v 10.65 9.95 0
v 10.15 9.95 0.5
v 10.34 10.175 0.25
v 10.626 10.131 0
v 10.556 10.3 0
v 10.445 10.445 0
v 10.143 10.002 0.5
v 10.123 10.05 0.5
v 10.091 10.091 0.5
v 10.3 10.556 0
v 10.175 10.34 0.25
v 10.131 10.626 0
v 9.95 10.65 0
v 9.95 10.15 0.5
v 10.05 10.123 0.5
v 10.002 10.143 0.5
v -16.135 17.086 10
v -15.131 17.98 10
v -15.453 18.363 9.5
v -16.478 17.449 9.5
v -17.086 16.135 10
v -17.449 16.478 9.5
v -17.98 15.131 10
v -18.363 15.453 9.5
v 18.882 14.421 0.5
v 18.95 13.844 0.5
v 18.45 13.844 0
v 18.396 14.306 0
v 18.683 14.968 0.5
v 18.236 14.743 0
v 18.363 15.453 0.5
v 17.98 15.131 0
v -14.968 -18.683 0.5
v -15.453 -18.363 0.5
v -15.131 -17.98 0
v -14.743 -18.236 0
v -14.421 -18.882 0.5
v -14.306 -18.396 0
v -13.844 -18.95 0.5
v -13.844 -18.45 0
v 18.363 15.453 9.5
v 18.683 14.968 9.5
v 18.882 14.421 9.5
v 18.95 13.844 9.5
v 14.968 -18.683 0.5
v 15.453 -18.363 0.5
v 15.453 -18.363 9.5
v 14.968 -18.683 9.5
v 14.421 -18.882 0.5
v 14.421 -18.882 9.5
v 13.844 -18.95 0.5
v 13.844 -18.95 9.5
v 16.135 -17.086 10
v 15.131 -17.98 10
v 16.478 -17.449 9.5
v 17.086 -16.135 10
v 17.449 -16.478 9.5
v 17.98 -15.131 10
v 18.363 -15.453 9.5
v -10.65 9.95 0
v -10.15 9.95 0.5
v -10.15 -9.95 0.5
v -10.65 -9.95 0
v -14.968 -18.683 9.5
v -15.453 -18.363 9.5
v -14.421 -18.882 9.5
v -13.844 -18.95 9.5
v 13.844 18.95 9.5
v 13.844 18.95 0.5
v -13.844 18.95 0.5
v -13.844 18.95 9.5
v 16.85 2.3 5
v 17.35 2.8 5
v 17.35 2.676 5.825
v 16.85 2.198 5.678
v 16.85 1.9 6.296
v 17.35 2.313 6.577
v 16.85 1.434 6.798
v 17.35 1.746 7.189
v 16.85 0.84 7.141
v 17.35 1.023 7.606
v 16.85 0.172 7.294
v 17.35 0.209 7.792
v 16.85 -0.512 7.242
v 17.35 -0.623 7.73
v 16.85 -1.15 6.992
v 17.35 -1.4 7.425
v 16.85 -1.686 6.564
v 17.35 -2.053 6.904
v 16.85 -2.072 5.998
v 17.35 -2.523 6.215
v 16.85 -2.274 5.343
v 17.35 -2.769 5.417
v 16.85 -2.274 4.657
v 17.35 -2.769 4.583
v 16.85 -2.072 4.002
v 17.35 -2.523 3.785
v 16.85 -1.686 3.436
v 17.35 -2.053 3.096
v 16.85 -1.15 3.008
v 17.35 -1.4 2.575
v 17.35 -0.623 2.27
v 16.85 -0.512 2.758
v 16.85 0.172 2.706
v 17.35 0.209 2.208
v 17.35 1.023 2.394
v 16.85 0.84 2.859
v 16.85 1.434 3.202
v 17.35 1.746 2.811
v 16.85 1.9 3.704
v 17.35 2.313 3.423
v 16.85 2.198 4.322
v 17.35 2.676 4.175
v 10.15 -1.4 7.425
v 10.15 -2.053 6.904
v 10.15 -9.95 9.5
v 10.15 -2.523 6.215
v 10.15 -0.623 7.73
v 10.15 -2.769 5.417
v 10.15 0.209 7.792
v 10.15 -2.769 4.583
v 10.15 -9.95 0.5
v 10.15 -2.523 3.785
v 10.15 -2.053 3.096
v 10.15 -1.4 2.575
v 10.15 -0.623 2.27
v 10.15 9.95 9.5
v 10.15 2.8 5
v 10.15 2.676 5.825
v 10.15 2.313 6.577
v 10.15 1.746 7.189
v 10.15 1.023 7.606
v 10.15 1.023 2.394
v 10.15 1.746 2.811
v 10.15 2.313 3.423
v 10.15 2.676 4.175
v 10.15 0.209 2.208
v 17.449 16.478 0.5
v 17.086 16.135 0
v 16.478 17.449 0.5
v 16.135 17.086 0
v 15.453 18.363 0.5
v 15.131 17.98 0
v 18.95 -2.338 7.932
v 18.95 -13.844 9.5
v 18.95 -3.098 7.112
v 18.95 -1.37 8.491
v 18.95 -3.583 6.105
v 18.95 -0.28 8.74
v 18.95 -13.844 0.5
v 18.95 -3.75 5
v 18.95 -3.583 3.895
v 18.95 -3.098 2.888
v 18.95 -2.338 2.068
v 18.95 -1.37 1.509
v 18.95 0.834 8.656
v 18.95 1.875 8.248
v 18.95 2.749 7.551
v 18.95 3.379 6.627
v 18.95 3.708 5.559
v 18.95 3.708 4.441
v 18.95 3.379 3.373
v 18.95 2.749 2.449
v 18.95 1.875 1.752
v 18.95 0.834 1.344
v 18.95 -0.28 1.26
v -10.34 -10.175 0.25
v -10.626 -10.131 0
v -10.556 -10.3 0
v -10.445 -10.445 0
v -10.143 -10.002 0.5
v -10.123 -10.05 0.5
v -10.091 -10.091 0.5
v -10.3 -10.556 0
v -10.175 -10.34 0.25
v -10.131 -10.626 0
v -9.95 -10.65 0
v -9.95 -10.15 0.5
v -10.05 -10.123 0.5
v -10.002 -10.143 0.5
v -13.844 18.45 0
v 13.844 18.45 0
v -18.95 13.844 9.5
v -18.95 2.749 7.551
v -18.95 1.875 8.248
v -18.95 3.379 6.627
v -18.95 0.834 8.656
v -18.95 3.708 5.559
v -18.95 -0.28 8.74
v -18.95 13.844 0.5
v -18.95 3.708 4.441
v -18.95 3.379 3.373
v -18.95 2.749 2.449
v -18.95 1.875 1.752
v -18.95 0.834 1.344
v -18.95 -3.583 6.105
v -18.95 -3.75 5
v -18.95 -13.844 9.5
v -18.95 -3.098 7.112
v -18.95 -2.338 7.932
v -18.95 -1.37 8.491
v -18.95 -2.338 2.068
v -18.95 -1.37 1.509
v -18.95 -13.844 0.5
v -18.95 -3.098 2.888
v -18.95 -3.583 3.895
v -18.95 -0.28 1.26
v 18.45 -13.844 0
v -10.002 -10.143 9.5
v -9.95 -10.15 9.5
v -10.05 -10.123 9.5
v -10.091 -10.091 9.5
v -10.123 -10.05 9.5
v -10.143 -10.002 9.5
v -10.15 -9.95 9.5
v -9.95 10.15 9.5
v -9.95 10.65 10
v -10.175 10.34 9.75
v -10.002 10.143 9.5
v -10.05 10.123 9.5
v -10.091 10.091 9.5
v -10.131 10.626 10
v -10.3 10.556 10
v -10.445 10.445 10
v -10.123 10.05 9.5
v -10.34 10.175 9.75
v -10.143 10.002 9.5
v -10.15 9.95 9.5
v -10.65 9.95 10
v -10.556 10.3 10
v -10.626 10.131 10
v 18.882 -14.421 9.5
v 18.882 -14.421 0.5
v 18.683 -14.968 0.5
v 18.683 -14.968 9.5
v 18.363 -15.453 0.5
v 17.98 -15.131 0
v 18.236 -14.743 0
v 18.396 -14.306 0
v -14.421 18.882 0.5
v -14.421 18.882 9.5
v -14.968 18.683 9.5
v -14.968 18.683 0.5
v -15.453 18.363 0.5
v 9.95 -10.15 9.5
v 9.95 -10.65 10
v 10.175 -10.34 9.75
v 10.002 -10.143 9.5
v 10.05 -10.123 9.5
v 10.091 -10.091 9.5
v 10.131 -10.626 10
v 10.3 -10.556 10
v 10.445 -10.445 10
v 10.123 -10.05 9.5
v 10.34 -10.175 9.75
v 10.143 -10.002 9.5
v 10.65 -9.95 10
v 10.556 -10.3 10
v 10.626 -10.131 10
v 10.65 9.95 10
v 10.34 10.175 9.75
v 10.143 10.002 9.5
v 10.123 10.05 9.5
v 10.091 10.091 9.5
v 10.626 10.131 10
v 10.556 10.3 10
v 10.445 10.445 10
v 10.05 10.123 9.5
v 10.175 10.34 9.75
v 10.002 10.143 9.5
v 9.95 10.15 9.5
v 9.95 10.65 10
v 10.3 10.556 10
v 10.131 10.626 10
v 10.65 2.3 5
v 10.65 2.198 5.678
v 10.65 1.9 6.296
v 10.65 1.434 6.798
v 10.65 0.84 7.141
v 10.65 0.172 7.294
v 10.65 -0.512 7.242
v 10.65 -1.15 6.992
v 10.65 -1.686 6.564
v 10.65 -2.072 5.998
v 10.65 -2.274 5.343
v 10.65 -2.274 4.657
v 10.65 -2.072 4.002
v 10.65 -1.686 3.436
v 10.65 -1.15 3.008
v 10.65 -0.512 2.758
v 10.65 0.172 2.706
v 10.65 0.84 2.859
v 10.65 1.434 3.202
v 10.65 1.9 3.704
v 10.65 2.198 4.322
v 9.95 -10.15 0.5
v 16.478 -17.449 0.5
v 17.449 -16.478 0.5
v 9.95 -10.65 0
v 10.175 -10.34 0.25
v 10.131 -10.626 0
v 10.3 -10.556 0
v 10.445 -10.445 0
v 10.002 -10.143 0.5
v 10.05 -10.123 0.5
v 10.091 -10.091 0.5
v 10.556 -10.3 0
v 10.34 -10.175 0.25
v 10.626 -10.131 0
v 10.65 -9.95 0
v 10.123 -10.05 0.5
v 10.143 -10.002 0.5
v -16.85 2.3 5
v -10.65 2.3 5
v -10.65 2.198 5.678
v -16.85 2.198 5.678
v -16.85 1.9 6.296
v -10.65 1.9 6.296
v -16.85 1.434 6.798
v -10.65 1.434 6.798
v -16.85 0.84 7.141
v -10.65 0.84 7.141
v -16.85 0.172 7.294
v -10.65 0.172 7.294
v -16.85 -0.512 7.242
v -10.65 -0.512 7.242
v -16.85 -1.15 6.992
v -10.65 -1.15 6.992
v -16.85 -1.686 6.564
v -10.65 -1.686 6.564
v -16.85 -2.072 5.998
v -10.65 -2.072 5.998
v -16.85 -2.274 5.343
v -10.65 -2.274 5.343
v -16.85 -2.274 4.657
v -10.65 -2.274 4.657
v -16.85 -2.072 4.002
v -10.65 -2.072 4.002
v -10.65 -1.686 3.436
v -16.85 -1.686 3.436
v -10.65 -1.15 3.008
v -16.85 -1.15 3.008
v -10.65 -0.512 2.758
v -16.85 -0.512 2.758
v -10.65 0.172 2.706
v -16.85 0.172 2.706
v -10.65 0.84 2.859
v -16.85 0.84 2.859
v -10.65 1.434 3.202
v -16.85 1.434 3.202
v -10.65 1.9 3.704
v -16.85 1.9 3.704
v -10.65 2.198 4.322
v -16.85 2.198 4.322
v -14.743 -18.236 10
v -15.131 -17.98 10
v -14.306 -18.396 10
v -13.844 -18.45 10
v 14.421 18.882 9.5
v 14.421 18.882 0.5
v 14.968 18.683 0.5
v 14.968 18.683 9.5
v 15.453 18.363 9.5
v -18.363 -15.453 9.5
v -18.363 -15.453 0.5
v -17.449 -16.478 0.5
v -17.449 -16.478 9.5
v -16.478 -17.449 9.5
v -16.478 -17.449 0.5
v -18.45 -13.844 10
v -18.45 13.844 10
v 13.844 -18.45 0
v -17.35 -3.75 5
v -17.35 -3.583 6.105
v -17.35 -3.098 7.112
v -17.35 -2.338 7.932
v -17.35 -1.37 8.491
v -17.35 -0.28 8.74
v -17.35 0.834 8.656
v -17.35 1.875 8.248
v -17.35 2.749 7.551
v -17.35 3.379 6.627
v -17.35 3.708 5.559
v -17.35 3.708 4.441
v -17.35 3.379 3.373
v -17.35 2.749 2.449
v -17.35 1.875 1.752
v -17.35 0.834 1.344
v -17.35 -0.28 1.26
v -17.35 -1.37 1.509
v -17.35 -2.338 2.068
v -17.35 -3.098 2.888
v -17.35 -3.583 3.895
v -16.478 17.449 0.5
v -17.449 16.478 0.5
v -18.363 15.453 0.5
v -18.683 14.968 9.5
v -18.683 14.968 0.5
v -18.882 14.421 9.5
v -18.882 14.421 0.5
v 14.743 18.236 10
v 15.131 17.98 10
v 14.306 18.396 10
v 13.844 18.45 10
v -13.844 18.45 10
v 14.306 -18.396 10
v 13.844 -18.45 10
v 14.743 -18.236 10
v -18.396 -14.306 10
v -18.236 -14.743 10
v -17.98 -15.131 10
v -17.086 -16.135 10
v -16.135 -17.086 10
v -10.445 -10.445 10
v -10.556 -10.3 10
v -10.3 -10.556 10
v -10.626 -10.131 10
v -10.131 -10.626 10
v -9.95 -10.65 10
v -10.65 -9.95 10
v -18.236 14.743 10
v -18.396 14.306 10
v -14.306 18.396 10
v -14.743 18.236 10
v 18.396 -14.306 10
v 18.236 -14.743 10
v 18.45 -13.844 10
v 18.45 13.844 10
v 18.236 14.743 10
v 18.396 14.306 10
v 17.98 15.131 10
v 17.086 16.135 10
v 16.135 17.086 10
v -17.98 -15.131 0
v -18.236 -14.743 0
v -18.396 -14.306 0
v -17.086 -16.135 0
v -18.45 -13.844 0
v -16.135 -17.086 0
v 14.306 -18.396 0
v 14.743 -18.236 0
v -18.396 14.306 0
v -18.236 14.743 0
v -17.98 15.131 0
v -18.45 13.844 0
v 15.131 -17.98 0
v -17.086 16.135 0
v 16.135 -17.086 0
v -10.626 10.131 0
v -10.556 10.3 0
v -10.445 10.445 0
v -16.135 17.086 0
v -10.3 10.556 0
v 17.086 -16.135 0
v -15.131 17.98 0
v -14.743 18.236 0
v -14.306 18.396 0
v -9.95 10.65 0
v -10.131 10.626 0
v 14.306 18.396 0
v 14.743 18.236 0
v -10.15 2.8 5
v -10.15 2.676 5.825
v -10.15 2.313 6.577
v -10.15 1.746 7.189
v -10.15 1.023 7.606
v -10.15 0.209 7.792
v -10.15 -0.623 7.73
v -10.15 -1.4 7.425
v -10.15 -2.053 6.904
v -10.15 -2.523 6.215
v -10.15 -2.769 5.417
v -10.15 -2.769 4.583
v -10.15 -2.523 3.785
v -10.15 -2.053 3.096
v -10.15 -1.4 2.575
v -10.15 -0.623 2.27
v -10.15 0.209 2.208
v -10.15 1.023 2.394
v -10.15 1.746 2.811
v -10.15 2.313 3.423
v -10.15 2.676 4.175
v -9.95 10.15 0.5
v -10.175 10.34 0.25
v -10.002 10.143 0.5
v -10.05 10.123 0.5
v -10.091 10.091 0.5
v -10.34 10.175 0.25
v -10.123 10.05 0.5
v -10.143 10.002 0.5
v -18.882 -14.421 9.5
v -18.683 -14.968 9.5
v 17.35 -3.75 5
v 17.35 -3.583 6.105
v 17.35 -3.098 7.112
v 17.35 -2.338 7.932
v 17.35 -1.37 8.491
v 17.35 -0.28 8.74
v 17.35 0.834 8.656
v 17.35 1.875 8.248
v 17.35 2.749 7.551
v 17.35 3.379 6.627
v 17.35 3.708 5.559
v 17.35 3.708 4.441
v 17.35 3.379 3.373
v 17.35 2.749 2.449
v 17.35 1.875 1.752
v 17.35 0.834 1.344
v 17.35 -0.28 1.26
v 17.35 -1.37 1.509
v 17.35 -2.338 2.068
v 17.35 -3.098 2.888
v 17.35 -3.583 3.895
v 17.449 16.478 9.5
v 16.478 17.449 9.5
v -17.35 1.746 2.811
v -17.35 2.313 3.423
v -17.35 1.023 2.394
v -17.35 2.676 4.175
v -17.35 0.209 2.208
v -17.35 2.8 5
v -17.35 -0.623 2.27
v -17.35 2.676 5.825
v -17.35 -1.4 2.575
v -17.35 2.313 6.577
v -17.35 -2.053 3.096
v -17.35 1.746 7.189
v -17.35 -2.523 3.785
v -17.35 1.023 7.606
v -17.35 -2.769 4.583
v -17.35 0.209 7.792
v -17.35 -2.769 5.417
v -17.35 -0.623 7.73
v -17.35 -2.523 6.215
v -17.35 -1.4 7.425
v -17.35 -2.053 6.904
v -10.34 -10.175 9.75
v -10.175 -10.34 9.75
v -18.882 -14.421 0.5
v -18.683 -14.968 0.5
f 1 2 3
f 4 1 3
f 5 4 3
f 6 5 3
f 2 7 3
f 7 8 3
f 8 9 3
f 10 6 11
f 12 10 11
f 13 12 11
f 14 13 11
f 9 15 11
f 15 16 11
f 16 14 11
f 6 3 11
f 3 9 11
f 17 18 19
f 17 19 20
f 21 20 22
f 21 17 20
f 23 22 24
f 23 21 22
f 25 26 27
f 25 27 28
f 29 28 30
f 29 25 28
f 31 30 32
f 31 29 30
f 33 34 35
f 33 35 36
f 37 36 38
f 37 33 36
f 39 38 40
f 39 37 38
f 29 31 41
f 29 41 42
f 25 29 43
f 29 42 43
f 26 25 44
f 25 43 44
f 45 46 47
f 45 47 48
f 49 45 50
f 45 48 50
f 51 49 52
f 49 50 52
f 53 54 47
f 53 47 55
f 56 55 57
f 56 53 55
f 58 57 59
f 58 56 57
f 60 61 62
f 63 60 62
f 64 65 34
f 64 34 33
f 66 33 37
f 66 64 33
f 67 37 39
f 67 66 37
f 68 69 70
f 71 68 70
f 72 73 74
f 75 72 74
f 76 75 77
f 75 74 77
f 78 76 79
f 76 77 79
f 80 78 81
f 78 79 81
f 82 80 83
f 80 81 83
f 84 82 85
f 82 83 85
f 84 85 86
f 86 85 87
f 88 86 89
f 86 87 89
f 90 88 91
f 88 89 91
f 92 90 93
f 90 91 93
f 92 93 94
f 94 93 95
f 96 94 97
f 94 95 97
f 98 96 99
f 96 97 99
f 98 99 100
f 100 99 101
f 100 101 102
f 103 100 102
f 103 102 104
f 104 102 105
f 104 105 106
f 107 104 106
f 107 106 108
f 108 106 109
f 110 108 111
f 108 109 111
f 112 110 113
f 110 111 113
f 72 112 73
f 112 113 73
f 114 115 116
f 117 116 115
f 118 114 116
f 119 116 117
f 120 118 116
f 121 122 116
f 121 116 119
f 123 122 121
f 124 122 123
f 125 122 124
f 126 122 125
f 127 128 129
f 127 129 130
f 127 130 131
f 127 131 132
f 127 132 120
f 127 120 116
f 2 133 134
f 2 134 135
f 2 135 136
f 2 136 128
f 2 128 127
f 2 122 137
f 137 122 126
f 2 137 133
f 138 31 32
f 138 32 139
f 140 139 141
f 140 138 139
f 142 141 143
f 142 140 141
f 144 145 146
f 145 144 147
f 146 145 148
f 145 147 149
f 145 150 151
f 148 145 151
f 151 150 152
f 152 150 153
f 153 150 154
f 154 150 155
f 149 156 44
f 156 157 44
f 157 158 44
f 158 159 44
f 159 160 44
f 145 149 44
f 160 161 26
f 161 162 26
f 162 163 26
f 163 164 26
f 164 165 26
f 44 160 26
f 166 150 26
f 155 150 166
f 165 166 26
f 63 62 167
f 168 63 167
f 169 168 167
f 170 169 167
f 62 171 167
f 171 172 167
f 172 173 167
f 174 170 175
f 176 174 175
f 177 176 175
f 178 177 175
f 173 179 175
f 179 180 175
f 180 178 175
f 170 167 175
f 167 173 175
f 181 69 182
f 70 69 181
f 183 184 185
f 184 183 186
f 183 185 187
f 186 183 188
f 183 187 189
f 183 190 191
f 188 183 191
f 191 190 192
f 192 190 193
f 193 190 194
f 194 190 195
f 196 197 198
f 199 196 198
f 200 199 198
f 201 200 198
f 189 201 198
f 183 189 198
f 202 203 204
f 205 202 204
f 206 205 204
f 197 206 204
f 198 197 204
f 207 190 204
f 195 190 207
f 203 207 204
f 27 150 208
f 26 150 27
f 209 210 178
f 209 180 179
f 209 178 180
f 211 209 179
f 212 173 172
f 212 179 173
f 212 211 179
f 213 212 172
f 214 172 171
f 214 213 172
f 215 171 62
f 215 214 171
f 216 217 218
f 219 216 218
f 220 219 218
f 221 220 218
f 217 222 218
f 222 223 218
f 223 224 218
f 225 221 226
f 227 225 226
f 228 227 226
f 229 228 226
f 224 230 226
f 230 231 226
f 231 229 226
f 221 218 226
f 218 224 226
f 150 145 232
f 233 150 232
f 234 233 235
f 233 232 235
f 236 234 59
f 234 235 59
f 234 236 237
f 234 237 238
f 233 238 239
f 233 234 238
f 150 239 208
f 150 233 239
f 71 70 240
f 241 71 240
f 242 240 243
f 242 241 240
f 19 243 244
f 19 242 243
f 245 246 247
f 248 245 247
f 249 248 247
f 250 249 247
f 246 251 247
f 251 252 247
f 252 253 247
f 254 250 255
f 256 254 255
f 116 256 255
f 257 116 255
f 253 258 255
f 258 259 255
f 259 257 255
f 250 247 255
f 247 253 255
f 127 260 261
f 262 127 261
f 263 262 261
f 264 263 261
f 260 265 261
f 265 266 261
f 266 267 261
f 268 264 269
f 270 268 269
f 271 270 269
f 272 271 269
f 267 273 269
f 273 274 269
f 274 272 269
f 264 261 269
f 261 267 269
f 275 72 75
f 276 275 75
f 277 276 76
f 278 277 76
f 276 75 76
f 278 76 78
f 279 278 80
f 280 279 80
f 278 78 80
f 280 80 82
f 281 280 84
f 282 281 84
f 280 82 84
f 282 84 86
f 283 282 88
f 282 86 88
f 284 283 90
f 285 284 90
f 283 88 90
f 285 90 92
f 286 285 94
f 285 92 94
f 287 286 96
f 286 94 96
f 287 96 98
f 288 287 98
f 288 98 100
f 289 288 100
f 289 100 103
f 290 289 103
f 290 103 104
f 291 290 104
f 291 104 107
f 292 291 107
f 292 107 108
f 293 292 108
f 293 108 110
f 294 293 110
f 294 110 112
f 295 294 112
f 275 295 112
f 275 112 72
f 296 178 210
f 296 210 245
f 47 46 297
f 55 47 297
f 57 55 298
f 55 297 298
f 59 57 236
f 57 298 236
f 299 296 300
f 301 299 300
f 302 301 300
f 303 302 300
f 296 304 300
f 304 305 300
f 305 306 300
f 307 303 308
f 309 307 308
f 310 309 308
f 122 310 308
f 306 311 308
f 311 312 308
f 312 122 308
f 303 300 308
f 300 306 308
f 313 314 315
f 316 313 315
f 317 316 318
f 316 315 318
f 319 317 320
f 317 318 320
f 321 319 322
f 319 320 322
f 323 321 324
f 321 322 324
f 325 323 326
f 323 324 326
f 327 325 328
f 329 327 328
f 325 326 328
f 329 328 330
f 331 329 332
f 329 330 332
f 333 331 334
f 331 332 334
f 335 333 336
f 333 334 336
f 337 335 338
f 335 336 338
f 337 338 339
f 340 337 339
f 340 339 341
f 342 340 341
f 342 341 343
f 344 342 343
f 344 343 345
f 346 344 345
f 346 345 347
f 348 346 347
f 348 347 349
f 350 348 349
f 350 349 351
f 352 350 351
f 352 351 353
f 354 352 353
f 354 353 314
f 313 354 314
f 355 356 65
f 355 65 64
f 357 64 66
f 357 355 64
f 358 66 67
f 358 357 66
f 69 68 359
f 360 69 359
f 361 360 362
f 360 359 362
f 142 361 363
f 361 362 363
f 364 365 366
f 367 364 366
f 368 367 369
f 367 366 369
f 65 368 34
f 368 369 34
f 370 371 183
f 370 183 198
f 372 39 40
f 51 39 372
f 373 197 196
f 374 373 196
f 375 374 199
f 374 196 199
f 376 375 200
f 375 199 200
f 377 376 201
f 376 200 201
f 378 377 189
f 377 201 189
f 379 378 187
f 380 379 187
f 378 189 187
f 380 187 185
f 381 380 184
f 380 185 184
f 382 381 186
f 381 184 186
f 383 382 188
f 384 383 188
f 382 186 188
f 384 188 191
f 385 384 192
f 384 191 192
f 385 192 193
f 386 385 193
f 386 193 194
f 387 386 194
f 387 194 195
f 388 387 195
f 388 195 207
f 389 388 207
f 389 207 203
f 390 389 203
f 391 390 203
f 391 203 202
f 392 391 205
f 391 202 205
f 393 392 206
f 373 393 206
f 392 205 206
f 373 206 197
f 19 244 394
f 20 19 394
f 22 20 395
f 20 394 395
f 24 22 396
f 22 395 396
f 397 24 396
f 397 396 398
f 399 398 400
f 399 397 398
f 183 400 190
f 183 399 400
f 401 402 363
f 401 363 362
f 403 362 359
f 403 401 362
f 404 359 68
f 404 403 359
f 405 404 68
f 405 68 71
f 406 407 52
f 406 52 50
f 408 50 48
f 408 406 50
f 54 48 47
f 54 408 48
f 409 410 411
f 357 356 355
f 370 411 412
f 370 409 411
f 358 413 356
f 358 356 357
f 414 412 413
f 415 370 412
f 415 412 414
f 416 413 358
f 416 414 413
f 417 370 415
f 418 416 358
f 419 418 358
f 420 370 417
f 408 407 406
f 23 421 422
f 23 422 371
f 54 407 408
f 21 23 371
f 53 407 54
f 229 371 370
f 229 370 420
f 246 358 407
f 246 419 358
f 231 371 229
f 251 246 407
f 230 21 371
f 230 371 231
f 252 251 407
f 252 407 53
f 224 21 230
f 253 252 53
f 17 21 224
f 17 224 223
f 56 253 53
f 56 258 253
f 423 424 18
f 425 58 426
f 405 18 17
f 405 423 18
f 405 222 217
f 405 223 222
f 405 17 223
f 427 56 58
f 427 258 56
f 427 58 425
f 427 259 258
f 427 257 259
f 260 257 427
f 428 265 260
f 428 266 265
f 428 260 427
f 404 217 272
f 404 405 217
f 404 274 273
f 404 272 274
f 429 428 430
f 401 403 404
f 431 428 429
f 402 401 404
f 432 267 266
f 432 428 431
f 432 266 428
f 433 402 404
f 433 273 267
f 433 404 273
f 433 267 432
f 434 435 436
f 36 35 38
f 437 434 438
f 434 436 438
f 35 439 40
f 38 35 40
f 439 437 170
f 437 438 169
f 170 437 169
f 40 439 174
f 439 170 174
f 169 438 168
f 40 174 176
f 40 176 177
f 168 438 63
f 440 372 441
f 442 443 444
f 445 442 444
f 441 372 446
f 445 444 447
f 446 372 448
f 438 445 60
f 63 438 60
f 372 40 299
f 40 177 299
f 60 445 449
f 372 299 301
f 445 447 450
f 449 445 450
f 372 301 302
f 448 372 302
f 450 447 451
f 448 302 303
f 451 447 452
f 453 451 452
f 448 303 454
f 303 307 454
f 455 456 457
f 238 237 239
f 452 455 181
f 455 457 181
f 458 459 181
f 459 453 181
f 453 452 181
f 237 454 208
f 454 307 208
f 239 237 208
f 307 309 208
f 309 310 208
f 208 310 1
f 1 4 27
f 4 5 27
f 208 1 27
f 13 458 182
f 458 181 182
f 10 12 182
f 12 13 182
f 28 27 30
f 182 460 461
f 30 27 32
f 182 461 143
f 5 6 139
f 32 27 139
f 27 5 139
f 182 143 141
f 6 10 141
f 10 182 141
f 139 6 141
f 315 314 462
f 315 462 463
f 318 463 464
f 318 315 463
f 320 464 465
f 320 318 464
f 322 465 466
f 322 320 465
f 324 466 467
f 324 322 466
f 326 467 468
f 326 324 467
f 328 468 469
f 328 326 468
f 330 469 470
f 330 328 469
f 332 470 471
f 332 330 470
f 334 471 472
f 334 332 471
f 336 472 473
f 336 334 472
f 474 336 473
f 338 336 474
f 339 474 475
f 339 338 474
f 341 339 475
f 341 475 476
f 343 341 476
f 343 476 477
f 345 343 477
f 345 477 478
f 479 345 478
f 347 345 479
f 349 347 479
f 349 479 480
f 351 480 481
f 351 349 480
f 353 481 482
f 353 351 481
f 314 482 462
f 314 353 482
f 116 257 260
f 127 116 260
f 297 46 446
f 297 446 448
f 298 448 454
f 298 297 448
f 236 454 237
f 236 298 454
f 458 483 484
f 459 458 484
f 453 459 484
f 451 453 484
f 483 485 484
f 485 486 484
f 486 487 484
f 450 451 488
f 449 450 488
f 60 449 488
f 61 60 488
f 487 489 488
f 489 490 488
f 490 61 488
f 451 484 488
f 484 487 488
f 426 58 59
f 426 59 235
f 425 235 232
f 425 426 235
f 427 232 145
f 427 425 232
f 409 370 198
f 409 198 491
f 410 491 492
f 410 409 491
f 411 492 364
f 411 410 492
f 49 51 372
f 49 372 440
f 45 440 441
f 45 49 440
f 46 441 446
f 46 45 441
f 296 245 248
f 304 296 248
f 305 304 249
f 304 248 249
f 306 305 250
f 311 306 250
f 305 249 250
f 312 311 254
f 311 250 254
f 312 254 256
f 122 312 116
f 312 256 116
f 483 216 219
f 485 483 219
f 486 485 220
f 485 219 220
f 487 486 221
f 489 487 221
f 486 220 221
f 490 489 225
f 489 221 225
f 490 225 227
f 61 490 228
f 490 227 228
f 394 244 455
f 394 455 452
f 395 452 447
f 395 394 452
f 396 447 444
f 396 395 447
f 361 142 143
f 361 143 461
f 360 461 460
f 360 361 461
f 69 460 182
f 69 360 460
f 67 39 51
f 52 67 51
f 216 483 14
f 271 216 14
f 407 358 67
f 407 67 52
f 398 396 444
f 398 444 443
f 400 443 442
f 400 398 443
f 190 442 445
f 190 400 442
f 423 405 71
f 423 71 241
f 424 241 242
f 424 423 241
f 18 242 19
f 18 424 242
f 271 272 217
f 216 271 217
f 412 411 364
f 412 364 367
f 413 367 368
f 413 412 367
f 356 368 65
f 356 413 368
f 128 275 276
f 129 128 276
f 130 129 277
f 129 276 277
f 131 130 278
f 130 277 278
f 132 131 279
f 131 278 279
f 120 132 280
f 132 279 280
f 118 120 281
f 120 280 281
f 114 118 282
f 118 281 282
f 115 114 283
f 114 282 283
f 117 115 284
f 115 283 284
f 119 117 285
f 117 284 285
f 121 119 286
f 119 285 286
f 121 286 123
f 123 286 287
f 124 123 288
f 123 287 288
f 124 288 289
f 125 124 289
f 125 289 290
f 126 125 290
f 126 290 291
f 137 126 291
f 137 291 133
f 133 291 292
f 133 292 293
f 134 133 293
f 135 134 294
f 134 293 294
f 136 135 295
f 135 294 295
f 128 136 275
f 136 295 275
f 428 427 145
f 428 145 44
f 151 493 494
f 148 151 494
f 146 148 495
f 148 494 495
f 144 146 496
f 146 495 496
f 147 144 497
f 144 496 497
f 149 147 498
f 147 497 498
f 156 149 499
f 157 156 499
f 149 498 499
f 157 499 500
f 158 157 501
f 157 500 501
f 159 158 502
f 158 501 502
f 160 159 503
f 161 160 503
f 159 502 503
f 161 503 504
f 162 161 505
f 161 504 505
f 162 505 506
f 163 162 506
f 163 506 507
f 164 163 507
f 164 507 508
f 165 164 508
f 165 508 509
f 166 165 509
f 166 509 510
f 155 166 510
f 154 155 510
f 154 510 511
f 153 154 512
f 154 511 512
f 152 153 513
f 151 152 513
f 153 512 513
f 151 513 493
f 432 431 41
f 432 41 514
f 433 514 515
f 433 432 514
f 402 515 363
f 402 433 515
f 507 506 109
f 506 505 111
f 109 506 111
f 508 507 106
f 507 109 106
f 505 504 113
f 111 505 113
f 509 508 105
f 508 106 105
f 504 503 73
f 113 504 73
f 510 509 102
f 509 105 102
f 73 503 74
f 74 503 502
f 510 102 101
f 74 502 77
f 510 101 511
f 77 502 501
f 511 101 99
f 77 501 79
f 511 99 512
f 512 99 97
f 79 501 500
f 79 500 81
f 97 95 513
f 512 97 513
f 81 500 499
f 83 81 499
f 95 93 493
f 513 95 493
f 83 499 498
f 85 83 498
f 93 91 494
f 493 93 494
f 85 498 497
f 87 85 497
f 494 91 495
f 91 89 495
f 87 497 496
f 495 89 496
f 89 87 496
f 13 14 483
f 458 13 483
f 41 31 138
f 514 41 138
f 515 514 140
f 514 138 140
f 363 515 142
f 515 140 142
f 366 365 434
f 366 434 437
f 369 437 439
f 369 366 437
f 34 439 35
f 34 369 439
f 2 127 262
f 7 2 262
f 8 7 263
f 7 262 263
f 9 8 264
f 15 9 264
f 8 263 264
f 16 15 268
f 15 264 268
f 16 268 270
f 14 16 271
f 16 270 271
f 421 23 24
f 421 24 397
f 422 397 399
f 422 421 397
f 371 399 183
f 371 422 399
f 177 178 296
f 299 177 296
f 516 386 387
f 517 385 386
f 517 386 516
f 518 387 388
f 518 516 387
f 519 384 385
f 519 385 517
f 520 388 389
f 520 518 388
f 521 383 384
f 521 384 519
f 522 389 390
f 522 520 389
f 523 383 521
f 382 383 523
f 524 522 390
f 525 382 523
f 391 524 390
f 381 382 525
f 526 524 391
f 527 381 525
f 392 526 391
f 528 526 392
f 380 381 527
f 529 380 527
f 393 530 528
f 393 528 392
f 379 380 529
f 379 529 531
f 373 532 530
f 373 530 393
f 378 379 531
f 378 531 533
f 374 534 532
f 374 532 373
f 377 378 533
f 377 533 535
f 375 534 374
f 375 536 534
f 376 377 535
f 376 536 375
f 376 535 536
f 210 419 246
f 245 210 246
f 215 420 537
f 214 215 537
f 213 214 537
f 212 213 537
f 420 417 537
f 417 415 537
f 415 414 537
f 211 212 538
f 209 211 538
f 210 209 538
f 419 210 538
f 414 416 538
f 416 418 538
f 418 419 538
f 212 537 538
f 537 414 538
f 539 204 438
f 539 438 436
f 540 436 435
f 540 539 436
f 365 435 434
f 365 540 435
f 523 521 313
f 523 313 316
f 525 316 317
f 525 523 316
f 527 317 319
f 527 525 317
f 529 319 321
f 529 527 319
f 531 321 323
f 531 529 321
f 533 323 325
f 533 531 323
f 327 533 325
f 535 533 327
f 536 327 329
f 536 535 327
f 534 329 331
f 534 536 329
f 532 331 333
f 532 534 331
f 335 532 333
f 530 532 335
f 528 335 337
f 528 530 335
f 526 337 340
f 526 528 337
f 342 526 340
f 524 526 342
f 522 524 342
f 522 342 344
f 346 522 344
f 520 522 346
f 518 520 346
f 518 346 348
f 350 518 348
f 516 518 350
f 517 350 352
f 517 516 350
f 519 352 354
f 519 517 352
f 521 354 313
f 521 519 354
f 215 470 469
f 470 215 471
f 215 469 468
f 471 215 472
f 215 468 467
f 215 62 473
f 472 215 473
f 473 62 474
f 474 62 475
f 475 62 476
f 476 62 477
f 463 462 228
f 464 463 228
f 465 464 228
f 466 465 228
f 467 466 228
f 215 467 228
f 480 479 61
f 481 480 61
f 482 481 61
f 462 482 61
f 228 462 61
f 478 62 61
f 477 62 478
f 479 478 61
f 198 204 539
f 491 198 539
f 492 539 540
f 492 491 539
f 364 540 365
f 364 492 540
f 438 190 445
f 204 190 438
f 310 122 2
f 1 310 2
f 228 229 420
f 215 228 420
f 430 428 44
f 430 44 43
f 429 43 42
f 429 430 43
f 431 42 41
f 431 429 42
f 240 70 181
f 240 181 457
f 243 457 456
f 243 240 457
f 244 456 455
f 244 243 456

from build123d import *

# Parameters (mm, degrees)
SKIZZE1_W                       = 20.3
SKIZZE1_H                       = 20.3
AUFSATZ_LINEAR_AUSTRAGEN1_DEPTH = 10
VERRUNDUNG1_R                   = 0.2
VERRUNDUNG2_R                   = 2.5
SKIZZE2_R                       = 2.3
SCHNITT_LINEAR_AUSTRAGEN1_DEPTH = 44.53748385
SKETCH1_R                       = 3.75
CUT_EXTRUDE1_DEPTH              = 1.6
CUT_EXTRUDE2_START              = -36.3
SKETCH1_2_R                     = 3.75
CUT_EXTRUDE2_DEPTH              = 1.6
FASE2_SIZE                      = 0.5


with BuildPart() as part:
    # Skizze1 → Aufsatz-Linear austragen1 (new body)
    with BuildSketch(Plane.XY):
        with BuildLine():
            Line((14.727440375, 18.95), (-14.727440375, 18.95))
            ThreePointArc((-14.727440375, 18.95), (-16.970562748, 16.970562748), (-18.95, 14.727440375))
            Line((-18.95, 14.727440375), (-18.95, -14.727440375))
            ThreePointArc((-18.95, -14.727440375), (-16.970562748, -16.970562748), (-14.727440375, -18.95))
            Line((-14.727440375, -18.95), (14.727440375, -18.95))
            ThreePointArc((14.727440375, -18.95), (16.970562748, -16.970562748), (18.95, -14.727440375))
            Line((18.95, -14.727440375), (18.95, 14.727440375))
            ThreePointArc((18.95, 14.727440375), (16.970562748, 16.970562748), (14.727440375, 18.95))
        make_face()
        Rectangle(SKIZZE1_W, SKIZZE1_H, mode=Mode.SUBTRACT)
    extrude(amount=AUFSATZ_LINEAR_AUSTRAGEN1_DEPTH)

    # Verrundung1
    verrundung1_edges = [part.edges().sort_by_distance(p)[0] for p in [
        (10.15, -10.15, 5),
        (10.15, 10.15, 5),
        (-10.15, 10.15, 5),
        (-10.15, -10.15, 5),
    ]]
    fillet(verrundung1_edges, radius=VERRUNDUNG1_R)

    # Verrundung2
    verrundung2_edges = [part.edges().sort_by_distance(p)[0] for p in [
        (18.95, 14.727440375, 5),
        (18.95, -14.727440375, 5),
        (14.727440375, -18.95, 5),
        (-14.727440375, -18.95, 5),
        (-18.95, -14.727440375, 5),
        (-18.95, 14.727440375, 5),
        (-14.727440375, 18.95, 5),
        (14.727440375, 18.95, 5),
    ]]
    fillet(verrundung2_edges, radius=VERRUNDUNG2_R)

    # Skizze2 → Schnitt-Linear austragen1 (cut, through all)
    with BuildSketch(Plane(origin=(18.95, 0, 0), x_dir=(0, 0, -1), z_dir=(1, 0, 0))):
        with Locations(Location((-5, 0, 0), (0, 0, 90))):
            Circle(SKIZZE2_R)
    extrude(amount=-SCHNITT_LINEAR_AUSTRAGEN1_DEPTH, mode=Mode.SUBTRACT)

    # Sketch1 → Cut-Extrude1 (cut)
    with BuildSketch(Plane.ZY.offset(18.95)):
        with Locations(Location((5, 0, 0), (0, 0, 270))):
            Circle(SKETCH1_R)
    extrude(amount=-CUT_EXTRUDE1_DEPTH, mode=Mode.SUBTRACT)

    # Sketch1<2> → Cut-Extrude2 (cut)
    with BuildSketch(Plane.ZY.offset(18.95).offset(CUT_EXTRUDE2_START)):
        with Locations(Location((5, 0, 0), (0, 0, 270))):
            Circle(SKETCH1_2_R)
    extrude(amount=-CUT_EXTRUDE2_DEPTH, mode=Mode.SUBTRACT)

    # Fase2
    fase2_edges = [part.edges().sort_by_distance(p)[0] for p in [
        (-10.15, -2.3, 5),
        (10.15, -2.3, 5),
        (-17.35, -2.3, 5),
        (17.35, -2.3, 5),
        (0, -10.15, 0),
        (0, -10.15, 10),
        (10.15, 0, 0),
        (10.15, 0, 10),
        (-10.15, 0, 0),
        (-10.15, 0, 10),
        (0, 10.15, 0),
        (0, 10.15, 10),
        (10.091421356, -10.091421356, 0),
        (10.091421356, -10.091421356, 10),
        (-10.091421356, -10.091421356, 0),
        (-10.091421356, -10.091421356, 10),
        (-10.091421356, 10.091421356, 0),
        (-10.091421356, 10.091421356, 10),
        (10.091421356, 10.091421356, 0),
        (10.091421356, 10.091421356, 10),
        (0, 18.95, 0),
        (0, 18.95, 10),
        (16.970562748, 16.970562748, 0),
        (18.95, 0, 0),
        (16.970562748, -16.970562748, 0),
        (0, -18.95, 0),
        (-16.970562748, -16.970562748, 0),
        (-18.95, 0, 0),
        (-16.970562748, 16.970562748, 0),
        (-14.700425655, 18.798614139, 0),
        (-18.798614139, 14.700425655, 0),
        (-18.798614139, -14.700425655, 0),
        (-14.700425655, -18.798614139, 0),
        (14.700425655, -18.798614139, 0),
        (18.798614139, -14.700425655, 0),
        (18.798614139, 14.700425655, 0),
        (14.700425655, 18.798614139, 0),
        (16.970562748, 16.970562748, 10),
        (-16.970562748, 16.970562748, 10),
        (-18.95, 0, 10),
        (-16.970562748, -16.970562748, 10),
        (0, -18.95, 10),
        (16.970562748, -16.970562748, 10),
        (18.95, 0, 10),
        (-14.700425655, 18.798614139, 10),
        (-18.798614139, 14.700425655, 10),
        (-18.798614139, -14.700425655, 10),
        (-14.700425655, -18.798614139, 10),
        (14.700425655, -18.798614139, 10),
        (18.798614139, -14.700425655, 10),
        (18.798614139, 14.700425655, 10),
        (14.700425655, 18.798614139, 10),
    ]]
    chamfer(fase2_edges, length=FASE2_SIZE)


solid = part.part
